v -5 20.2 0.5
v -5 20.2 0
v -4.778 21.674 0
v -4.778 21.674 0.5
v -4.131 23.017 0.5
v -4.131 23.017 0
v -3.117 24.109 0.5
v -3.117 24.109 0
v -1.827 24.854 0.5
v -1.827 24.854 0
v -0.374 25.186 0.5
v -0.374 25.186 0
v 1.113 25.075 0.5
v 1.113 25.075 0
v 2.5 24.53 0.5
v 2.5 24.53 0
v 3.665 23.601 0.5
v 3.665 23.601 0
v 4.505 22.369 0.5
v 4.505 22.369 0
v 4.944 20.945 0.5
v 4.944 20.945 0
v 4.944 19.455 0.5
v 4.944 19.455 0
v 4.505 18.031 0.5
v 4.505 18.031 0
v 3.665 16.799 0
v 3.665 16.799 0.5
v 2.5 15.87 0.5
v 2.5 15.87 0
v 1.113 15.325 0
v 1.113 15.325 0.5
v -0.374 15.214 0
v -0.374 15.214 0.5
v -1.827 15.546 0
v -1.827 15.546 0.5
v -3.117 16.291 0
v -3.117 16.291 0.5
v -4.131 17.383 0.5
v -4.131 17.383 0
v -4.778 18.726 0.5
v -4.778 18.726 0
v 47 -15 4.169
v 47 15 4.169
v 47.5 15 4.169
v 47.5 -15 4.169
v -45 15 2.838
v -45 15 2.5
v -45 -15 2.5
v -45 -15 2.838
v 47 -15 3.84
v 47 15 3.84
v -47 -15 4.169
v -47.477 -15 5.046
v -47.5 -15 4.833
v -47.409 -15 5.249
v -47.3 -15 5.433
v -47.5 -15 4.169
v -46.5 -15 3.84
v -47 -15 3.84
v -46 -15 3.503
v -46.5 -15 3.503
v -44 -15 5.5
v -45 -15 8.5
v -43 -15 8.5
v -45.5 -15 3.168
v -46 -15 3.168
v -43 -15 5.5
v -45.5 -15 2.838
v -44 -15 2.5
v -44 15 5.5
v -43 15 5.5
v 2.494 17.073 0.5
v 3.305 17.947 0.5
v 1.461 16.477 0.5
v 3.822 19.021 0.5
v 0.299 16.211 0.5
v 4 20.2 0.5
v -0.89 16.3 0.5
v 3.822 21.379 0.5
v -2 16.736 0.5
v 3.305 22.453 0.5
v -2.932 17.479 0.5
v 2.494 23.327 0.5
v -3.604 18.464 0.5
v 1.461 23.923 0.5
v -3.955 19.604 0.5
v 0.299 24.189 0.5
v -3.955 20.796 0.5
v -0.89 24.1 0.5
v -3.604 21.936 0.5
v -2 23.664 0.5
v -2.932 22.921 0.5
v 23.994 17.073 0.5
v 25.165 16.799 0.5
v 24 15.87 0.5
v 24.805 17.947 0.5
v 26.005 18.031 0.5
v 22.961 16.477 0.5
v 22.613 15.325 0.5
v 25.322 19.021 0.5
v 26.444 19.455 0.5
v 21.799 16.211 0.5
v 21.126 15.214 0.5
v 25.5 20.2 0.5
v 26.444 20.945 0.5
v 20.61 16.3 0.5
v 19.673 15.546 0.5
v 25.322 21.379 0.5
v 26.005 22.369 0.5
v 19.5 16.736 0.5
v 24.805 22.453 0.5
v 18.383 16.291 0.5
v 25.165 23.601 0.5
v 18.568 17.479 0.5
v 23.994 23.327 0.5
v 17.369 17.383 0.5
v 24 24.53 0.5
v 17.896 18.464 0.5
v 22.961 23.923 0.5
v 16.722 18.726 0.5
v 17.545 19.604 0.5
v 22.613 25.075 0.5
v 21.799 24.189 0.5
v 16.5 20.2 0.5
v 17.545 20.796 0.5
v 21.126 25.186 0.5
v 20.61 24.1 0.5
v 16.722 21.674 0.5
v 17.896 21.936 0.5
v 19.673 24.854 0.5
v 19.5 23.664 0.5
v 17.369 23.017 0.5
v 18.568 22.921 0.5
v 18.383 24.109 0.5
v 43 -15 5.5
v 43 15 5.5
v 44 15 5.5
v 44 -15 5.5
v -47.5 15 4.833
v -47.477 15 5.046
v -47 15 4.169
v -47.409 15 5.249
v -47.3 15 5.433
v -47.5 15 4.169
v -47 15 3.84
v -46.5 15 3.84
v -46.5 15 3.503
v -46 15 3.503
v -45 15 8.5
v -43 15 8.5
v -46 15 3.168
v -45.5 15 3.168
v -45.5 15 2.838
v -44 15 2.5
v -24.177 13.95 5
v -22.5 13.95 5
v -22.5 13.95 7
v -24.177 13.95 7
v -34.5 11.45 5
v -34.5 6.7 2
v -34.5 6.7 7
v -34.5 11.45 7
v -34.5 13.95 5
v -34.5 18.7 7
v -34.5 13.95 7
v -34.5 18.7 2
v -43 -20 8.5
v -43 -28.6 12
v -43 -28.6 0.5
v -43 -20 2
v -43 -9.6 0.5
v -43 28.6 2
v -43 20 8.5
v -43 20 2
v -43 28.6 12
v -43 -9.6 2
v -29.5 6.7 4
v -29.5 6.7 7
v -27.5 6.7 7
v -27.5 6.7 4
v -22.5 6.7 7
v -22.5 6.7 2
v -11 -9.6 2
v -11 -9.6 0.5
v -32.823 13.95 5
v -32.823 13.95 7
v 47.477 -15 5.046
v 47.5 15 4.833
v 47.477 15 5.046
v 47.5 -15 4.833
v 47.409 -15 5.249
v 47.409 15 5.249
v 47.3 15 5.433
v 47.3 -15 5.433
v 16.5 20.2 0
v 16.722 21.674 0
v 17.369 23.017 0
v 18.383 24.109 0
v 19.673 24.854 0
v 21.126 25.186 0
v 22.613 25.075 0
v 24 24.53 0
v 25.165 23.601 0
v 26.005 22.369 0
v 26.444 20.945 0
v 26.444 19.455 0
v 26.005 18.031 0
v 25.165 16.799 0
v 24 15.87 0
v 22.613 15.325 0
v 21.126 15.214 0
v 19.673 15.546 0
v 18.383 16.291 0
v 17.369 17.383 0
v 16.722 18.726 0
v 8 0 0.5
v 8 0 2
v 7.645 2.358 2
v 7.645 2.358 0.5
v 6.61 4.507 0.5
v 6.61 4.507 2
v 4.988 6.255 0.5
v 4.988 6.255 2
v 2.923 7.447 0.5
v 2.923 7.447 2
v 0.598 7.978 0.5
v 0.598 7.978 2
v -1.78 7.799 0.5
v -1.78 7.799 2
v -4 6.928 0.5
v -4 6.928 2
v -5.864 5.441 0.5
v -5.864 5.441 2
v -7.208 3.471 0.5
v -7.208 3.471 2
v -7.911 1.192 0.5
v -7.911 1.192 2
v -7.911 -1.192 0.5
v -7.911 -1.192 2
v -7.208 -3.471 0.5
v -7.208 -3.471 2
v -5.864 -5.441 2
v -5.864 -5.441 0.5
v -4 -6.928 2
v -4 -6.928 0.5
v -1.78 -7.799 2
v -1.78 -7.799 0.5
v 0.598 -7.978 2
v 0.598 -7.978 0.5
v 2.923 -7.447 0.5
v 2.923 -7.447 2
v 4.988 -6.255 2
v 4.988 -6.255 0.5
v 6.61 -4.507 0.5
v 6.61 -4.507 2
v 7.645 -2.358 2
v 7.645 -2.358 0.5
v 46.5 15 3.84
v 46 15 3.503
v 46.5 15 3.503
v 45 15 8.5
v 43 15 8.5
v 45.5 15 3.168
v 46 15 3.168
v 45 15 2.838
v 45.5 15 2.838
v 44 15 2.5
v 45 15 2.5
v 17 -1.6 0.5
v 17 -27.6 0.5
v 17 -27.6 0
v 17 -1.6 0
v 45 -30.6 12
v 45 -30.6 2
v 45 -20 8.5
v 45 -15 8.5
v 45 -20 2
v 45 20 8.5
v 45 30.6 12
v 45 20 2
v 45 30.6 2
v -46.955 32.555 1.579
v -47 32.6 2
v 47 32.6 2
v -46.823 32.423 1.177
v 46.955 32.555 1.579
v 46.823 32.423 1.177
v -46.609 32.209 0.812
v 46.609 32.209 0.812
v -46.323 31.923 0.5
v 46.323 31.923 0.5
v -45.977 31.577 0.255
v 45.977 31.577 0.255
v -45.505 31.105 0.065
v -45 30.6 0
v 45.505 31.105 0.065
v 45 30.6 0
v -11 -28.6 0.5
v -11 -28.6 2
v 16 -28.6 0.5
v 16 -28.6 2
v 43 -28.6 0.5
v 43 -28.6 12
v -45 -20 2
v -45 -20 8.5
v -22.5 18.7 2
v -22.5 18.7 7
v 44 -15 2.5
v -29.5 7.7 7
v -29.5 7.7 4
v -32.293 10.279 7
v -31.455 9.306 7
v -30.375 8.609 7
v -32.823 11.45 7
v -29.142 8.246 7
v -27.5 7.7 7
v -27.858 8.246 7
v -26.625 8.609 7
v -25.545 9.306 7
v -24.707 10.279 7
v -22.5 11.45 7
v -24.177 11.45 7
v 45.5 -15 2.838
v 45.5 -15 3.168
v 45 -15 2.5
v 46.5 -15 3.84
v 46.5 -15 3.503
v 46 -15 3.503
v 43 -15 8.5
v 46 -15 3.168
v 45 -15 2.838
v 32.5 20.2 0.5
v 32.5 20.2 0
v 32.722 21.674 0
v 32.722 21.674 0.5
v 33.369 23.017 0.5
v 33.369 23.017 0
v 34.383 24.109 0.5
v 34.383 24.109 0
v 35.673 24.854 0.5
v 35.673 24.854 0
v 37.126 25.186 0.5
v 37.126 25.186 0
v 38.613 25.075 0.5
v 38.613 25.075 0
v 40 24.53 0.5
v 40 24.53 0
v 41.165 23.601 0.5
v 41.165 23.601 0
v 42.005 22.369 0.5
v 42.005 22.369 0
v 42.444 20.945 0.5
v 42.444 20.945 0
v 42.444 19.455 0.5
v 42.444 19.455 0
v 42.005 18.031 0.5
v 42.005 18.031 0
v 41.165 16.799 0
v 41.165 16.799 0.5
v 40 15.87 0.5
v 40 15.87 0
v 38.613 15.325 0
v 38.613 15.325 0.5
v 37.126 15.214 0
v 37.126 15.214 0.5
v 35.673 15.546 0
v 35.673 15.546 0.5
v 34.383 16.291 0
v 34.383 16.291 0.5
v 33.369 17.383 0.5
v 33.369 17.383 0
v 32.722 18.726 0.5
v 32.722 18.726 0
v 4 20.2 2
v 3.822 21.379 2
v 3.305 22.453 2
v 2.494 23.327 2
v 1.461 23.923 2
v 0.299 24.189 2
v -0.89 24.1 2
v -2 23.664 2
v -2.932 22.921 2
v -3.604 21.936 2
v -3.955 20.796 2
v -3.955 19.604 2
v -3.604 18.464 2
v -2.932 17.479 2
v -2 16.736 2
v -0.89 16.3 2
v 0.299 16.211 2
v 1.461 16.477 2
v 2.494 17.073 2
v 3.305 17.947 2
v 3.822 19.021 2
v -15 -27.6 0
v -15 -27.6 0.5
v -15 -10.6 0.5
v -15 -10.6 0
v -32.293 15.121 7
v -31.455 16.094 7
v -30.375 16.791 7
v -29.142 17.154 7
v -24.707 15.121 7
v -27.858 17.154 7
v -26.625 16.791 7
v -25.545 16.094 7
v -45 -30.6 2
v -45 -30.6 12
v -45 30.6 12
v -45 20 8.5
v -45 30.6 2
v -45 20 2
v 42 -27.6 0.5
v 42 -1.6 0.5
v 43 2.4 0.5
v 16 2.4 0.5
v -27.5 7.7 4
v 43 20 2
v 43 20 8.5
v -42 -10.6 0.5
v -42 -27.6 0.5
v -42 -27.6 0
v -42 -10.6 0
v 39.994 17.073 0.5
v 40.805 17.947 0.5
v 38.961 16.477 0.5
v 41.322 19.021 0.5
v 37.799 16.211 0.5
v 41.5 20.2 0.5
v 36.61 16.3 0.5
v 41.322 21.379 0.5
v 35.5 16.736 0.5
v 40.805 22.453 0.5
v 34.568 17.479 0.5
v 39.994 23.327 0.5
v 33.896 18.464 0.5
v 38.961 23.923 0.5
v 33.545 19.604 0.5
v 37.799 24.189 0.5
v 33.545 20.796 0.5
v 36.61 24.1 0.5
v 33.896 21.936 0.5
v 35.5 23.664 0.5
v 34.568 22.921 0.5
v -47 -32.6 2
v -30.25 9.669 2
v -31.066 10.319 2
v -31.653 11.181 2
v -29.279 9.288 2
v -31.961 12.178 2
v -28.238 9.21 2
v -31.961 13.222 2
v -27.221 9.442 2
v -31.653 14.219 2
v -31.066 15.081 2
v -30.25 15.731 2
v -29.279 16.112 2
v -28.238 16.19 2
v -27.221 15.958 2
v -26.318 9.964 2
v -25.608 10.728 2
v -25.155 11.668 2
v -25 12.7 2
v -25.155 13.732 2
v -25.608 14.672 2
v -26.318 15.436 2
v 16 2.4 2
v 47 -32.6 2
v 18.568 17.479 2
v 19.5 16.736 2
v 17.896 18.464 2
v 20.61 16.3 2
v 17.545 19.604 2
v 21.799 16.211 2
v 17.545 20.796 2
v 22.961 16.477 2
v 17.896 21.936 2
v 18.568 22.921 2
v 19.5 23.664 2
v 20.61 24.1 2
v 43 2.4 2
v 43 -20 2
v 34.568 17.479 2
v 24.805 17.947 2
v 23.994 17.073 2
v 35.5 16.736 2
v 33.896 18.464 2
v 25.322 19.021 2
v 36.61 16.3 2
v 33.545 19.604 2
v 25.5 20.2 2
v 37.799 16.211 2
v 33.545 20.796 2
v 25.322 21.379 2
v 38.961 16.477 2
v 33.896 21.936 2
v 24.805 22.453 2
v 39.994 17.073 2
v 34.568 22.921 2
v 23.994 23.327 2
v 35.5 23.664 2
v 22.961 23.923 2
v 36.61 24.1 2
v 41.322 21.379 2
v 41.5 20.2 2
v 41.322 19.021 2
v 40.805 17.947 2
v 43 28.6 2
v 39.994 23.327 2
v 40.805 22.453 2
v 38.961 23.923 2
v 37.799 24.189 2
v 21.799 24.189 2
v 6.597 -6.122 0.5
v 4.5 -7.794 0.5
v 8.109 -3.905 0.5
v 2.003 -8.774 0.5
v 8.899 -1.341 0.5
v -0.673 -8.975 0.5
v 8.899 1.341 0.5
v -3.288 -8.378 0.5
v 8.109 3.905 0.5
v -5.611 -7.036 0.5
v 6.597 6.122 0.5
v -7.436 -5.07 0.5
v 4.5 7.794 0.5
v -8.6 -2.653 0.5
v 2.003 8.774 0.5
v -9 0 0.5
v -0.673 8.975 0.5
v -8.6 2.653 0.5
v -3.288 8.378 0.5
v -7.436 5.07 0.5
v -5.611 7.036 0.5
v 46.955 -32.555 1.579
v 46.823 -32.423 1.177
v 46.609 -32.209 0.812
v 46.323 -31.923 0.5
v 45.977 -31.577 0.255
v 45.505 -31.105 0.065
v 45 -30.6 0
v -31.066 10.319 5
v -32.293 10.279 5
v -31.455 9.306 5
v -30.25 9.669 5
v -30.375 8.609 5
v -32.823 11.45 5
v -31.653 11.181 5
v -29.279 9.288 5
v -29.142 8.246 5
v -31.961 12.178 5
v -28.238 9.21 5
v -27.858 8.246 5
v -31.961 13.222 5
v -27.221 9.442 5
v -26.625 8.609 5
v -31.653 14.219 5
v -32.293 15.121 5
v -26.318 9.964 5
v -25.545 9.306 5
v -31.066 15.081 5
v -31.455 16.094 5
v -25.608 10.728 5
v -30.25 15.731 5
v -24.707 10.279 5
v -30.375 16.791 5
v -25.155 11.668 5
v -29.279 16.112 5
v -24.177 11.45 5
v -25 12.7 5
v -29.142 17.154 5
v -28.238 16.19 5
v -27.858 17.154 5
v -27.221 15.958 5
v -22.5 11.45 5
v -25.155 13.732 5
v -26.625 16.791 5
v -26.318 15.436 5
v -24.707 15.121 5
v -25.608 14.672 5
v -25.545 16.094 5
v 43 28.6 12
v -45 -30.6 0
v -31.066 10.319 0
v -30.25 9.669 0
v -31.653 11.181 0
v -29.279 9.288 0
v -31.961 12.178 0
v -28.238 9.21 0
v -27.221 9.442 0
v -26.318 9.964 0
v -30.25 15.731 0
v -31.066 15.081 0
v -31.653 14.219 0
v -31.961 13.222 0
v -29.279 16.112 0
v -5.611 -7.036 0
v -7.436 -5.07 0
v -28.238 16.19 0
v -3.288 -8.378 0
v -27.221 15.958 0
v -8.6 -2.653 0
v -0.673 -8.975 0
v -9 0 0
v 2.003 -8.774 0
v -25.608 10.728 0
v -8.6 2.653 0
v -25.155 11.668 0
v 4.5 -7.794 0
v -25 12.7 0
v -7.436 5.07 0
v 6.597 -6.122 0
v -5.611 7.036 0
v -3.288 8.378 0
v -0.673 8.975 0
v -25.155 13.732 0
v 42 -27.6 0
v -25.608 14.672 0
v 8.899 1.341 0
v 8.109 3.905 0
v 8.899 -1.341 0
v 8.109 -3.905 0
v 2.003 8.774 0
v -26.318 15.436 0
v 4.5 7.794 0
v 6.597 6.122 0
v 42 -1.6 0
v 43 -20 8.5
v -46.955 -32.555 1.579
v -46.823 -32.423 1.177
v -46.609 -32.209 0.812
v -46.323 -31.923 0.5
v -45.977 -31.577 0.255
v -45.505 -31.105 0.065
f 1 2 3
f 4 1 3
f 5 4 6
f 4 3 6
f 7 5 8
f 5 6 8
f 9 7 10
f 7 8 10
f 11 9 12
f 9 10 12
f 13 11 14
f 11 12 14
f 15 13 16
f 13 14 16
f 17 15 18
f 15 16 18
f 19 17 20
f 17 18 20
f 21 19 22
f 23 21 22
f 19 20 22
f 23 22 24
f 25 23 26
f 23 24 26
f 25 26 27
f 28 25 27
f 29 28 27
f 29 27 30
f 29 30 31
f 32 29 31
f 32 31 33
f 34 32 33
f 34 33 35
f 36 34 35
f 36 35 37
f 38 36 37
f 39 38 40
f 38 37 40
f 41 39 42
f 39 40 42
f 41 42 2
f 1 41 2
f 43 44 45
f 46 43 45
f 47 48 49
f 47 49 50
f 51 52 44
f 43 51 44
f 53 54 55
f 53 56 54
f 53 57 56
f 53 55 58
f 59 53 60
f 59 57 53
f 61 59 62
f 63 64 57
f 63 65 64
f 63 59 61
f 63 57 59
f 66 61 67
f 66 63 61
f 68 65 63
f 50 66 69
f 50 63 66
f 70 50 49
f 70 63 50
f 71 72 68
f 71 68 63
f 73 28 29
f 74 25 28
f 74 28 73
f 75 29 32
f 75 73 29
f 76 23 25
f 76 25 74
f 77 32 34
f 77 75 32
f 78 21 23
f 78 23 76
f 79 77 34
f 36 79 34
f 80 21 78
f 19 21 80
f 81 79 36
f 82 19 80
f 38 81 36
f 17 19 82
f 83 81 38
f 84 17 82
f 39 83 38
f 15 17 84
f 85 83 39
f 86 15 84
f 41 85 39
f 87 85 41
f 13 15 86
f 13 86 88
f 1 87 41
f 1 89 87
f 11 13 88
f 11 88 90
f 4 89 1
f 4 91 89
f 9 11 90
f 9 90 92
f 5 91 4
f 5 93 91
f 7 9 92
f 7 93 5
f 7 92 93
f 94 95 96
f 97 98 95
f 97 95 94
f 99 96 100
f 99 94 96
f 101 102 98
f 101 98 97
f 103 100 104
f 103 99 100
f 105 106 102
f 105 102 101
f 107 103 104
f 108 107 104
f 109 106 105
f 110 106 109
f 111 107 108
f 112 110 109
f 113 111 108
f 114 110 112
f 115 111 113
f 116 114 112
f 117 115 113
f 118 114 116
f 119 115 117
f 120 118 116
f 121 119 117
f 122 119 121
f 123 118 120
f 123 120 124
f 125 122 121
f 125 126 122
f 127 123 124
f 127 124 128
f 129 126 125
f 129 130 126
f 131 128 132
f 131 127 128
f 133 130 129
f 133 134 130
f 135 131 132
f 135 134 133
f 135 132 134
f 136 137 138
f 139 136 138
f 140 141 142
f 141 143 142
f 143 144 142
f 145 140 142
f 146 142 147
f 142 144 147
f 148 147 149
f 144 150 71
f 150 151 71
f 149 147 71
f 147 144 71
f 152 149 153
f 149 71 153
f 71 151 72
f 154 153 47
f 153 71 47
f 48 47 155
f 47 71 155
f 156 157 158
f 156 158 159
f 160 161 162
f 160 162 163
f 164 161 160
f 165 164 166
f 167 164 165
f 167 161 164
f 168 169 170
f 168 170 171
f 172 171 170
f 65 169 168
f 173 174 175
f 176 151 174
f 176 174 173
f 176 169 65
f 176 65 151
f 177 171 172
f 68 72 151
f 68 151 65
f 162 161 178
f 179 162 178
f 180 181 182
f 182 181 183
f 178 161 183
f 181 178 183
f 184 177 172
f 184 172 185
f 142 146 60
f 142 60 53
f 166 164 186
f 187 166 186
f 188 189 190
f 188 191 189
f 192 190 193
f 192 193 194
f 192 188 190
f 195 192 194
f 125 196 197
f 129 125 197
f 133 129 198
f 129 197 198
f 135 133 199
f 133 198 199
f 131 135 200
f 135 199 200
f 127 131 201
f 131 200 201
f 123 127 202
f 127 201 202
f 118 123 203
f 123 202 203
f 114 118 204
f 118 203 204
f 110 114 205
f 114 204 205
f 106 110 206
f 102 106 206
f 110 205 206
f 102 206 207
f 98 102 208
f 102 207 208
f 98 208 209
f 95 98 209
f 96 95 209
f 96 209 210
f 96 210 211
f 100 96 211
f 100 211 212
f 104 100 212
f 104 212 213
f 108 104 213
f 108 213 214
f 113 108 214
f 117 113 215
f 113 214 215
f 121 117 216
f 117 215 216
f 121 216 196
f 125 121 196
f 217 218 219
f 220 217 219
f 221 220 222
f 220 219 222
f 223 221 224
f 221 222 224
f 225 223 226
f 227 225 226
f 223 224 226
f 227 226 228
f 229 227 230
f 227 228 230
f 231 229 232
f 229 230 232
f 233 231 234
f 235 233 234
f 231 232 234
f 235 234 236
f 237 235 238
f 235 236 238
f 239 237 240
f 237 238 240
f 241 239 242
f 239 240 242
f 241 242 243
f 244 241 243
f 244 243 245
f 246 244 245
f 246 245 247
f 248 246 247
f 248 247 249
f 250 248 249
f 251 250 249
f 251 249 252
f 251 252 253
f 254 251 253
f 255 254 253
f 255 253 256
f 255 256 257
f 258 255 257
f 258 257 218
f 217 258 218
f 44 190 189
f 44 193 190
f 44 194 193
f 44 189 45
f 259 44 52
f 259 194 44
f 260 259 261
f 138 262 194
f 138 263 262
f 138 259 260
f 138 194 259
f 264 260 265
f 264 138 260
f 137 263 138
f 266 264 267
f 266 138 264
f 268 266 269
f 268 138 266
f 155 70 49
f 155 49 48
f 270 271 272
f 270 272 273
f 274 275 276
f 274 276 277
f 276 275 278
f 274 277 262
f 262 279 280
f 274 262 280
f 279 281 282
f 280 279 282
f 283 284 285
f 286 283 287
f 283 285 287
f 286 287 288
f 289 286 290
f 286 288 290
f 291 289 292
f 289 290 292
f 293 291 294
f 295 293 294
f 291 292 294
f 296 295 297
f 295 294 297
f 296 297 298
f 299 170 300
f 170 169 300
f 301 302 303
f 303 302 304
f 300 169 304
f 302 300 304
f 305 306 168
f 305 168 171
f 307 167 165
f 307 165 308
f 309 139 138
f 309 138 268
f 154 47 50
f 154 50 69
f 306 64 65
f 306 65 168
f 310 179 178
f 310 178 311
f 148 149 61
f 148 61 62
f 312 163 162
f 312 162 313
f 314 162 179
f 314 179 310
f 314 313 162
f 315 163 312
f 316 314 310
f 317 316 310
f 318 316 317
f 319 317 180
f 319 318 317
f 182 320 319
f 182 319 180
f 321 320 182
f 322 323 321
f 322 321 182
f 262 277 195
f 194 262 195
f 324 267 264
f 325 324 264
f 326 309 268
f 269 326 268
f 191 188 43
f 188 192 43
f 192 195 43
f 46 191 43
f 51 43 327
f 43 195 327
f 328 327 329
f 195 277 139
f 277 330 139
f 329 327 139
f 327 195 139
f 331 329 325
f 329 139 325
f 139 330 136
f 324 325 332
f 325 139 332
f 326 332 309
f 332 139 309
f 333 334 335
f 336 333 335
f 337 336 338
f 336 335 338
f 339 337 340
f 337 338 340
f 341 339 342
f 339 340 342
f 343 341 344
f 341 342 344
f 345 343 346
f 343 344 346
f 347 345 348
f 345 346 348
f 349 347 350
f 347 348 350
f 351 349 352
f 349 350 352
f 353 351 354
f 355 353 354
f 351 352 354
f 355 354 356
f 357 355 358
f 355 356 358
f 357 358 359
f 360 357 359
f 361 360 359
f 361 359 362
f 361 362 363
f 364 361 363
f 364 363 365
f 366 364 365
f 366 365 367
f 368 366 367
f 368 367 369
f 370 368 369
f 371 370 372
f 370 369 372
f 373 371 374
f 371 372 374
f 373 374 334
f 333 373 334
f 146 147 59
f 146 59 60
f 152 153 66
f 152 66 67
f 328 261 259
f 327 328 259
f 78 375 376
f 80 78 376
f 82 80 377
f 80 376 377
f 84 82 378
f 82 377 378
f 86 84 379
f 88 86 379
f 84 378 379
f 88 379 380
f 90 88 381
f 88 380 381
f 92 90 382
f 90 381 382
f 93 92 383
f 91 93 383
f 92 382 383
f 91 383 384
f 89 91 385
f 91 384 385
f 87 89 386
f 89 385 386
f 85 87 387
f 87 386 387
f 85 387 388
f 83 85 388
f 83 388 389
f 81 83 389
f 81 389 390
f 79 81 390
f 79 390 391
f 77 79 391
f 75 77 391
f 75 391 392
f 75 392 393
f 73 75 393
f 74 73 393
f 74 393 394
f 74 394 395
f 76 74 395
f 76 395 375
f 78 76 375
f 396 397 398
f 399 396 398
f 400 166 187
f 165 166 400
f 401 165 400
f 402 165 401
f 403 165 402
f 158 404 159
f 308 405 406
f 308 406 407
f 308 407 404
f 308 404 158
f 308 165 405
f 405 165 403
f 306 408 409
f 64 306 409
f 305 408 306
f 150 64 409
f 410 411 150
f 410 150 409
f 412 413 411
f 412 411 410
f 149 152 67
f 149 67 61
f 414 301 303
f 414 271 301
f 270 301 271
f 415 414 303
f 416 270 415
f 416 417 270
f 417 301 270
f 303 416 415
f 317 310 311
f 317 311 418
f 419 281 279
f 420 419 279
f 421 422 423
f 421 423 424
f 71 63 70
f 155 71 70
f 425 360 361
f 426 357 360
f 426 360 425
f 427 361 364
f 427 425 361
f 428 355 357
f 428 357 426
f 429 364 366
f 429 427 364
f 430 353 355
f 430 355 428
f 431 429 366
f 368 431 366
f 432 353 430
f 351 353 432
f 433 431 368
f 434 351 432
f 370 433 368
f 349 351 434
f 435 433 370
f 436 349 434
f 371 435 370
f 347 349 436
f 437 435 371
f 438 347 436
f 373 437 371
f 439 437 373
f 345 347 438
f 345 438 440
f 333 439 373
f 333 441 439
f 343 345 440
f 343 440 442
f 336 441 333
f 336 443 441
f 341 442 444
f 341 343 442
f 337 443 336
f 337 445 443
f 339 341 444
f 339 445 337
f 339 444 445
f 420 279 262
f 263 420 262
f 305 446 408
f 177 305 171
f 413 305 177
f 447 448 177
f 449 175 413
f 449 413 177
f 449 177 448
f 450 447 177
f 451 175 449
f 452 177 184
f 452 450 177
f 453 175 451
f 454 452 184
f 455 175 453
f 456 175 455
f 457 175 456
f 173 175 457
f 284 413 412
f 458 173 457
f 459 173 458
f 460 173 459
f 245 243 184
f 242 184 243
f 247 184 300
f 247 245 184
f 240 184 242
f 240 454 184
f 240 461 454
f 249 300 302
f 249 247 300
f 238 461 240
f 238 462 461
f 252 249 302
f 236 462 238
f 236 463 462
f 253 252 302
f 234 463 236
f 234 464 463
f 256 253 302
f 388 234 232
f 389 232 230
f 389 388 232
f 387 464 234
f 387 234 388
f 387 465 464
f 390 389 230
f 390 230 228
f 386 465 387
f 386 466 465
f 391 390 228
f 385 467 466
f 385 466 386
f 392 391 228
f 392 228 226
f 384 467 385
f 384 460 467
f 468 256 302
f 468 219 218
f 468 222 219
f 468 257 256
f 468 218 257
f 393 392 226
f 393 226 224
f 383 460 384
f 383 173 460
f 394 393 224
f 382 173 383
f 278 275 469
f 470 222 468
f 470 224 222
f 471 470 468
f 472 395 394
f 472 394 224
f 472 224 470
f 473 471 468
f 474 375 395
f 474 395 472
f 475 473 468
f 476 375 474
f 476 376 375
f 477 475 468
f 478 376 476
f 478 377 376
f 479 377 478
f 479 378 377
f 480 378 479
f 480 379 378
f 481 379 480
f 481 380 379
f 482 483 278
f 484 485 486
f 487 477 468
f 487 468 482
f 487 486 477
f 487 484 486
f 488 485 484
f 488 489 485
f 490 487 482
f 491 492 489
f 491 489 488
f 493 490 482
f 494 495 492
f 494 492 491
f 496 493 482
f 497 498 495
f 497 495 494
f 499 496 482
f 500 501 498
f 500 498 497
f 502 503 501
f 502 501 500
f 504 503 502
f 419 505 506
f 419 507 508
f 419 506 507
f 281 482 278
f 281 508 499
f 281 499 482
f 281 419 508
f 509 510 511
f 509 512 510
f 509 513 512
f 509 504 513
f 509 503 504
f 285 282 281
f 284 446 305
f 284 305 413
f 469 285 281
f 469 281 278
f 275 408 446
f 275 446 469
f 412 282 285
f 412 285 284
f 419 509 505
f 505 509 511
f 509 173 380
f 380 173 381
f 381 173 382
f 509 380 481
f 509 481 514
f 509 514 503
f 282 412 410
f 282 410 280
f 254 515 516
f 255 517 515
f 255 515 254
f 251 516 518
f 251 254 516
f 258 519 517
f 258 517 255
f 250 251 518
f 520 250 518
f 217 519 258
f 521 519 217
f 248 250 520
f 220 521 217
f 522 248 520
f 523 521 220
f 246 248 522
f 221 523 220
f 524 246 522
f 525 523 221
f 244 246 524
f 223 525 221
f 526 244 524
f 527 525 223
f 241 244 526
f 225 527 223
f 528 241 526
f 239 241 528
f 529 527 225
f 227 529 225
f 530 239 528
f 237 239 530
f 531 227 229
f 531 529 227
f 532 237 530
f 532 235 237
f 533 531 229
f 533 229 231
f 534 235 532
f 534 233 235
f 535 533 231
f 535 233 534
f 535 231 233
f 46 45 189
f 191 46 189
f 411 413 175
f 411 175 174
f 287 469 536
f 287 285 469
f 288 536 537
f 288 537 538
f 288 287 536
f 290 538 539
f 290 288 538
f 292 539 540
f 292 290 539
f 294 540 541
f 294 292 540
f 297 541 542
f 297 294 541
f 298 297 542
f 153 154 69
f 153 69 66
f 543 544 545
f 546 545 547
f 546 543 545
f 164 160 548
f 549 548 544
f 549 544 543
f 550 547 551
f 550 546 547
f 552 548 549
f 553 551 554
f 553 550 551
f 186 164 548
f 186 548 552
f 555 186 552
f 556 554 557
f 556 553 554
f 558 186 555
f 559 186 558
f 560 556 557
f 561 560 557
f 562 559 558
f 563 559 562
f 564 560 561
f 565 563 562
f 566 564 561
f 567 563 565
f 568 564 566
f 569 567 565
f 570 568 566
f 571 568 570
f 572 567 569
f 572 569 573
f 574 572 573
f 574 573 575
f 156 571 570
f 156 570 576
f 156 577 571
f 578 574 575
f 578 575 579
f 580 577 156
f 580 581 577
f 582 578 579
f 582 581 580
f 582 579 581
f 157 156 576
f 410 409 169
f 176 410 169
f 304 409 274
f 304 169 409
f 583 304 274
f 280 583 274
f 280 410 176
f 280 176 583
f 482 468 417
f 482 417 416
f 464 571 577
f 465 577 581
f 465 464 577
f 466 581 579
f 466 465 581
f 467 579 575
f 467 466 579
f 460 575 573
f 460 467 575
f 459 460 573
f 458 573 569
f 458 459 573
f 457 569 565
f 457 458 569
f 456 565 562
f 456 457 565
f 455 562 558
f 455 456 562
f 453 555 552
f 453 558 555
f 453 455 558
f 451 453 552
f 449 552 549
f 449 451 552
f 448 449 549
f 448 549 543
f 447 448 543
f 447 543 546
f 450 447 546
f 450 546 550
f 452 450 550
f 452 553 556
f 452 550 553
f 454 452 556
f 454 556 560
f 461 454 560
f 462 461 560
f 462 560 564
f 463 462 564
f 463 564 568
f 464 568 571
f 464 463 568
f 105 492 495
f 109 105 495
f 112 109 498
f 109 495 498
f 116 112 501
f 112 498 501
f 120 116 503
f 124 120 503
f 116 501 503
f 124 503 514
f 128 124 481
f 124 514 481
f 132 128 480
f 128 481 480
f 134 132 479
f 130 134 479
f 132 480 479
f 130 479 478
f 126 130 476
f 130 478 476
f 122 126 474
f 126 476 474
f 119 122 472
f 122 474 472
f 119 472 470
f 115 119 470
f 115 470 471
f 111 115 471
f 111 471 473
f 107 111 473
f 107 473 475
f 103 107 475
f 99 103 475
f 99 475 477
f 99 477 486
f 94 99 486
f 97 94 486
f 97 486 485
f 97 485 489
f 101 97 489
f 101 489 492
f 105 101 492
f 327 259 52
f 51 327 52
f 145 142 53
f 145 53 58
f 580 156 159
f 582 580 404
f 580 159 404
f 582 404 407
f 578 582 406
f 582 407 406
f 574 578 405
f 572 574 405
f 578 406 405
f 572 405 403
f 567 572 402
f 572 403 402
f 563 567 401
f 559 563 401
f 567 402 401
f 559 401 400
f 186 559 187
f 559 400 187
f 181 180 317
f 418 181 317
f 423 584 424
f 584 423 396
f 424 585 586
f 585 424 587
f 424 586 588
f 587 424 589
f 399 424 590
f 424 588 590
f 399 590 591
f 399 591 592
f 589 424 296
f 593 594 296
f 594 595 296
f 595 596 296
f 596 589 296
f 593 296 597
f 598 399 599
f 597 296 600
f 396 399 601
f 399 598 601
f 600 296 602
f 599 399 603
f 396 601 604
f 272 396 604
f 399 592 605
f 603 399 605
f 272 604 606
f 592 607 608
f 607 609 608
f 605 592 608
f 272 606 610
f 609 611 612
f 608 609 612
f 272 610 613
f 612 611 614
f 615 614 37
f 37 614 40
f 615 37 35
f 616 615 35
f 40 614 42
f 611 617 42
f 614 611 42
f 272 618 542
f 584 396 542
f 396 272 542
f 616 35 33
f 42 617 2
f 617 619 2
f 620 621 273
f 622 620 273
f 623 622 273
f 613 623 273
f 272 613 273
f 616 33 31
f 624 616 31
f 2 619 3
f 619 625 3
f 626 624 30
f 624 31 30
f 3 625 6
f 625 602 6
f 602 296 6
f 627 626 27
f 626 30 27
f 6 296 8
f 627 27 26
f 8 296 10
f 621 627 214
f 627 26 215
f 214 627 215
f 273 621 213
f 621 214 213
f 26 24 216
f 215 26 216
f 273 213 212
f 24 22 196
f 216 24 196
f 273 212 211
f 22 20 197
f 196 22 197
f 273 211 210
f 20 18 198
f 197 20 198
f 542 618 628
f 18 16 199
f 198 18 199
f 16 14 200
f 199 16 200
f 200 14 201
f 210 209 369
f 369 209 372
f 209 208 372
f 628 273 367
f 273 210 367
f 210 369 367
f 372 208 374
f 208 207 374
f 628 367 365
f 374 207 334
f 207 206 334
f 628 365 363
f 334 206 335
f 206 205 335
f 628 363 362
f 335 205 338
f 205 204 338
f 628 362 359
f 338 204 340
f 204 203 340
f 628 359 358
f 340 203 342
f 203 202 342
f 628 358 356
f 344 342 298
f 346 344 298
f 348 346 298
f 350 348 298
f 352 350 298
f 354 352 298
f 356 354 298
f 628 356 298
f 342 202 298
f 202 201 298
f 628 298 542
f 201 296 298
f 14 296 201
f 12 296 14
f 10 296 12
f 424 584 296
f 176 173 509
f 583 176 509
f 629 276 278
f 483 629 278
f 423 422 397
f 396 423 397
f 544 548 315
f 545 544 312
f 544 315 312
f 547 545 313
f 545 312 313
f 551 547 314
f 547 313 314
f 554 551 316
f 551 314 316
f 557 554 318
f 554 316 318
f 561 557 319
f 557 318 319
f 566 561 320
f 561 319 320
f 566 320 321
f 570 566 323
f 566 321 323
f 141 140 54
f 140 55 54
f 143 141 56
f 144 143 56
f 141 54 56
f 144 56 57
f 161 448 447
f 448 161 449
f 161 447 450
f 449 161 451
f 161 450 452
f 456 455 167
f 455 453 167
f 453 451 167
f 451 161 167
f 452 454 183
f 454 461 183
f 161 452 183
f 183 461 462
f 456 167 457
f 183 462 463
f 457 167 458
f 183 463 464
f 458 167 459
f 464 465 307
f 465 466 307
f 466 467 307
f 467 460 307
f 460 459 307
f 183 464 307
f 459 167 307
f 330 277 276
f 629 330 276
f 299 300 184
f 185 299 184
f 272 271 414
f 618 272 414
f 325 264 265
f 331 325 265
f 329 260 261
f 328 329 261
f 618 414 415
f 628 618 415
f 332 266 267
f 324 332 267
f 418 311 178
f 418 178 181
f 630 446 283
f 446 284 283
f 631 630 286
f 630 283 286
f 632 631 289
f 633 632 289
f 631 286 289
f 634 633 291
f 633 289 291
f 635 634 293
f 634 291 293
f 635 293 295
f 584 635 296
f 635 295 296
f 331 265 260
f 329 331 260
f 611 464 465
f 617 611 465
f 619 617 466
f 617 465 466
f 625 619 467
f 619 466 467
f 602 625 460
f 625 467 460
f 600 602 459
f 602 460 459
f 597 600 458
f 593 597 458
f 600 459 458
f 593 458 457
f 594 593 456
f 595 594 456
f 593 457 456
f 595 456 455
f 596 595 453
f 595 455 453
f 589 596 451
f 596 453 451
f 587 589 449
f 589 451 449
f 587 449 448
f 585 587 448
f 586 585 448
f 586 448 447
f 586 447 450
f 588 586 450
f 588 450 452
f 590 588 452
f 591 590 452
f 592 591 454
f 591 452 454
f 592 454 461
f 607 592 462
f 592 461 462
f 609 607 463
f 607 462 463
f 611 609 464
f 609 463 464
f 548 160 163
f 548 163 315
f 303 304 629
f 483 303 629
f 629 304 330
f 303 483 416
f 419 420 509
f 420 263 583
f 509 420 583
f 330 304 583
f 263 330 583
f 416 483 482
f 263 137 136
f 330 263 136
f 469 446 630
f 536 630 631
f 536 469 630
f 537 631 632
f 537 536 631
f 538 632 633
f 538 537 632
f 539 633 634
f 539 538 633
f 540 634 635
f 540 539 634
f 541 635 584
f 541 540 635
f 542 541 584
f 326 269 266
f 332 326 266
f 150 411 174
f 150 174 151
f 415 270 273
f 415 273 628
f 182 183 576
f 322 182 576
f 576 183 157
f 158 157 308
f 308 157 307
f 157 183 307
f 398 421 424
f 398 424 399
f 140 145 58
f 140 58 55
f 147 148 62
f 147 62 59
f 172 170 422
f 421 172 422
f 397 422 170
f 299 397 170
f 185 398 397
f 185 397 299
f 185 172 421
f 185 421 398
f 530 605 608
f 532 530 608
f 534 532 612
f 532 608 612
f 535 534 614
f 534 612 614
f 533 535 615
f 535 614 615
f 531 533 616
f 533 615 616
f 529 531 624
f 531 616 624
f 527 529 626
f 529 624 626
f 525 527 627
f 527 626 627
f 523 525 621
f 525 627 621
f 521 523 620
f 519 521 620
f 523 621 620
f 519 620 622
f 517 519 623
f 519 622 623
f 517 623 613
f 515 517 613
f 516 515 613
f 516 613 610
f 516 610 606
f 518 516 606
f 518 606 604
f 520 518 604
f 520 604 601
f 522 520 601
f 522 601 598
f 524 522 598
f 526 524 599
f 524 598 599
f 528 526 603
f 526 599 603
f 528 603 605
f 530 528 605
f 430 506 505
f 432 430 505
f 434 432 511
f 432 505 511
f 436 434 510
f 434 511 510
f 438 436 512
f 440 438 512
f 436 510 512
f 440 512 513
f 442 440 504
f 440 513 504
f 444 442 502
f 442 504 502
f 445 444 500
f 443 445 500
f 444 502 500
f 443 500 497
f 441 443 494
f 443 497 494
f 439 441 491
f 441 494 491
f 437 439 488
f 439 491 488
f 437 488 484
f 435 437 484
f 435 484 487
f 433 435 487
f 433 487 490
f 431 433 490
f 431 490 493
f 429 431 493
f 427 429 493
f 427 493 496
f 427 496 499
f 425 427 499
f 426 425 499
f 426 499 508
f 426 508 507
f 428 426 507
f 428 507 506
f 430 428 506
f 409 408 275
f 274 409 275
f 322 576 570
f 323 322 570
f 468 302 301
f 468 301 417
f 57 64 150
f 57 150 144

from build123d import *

# Parameters (mm, degrees)
SKETCH_1_W             = 94
SKETCH_1_H             = 65.2
EXTRUDE_1_DEPTH        = 2
SKETCH_2_R             = 8
SKETCH_2_R_2           = 3.5
SKETCH_2_R_3           = 4
SKETCH_2_W             = 27
SKETCH_2_H             = 17
SKETCH_2_W_2           = 25
SKETCH_2_H_2           = 26
CUT_EXTRUDE_1_DEPTH    = 2
SKETCH_3_W             = 90
SKETCH_3_H             = 61.2
SKETCH_3_W_2           = 86
SKETCH_3_H_2           = 57.2
EXTRUDE_2_DEPTH        = 10
SKETCH_4_R             = 9
SKETCH_4_R_2           = 5
CUT_EXTRUDE_4_DEPTH    = 0.5
SKETCH_5_W             = 27
SKETCH_5_H             = 31
SKETCH_5_W_2           = 32
SKETCH_5_H_2           = 19
CUT_EXTRUDE_5_DEPTH    = 1.5
SKETCH_6_W             = 12
SKETCH_6_H             = 12
SKETCH_6_R             = 3.5
EXTRUDE_4_DEPTH        = 5
SKETCH_7_W             = 2
SKETCH_7_H             = 1
CUT_EXTRUDE_6_DEPTH    = 3
CUT_EXTRUDE_7_DEPTH    = 2
SKETCH_10_W            = 6
SKETCH_10_H            = 30
EXTRUDE_5_DEPTH        = 3
CUT_EXTRUDE_9_DEPTH    = 30
CUT_EXTRUDE_10_DEPTH   = 30
CUT_EXTRUDE_11_DEPTH   = 30
FILLET_1_R             = 1
FILLET_2_R             = 2
FILLET_1_OF_MIRROR_9_R = 1
SKETCH_17_R            = 4.5
CUT_EXTRUDE_13_DEPTH   = 2
SKETCH_18_W            = 1.677095884
SKETCH_18_H            = 2.5
CUT_EXTRUDE_14_DEPTH   = 2
SKETCH_19_W            = 1
SKETCH_19_H            = 3
CUT_EXTRUDE_15_DEPTH   = 30


with BuildPart() as part:
    # 草图1 → 凸台-拉伸1 (new body)
    with BuildSketch(Plane.XY):
        Rectangle(SKETCH_1_W, SKETCH_1_H)
    extrude(amount=EXTRUDE_1_DEPTH)

    # 草图2 → 切除-拉伸1 (cut)
    with BuildSketch(Plane.XY.offset(2)):
        Circle(SKETCH_2_R)
        with Locations((-28.5, 12.7)):
            Circle(SKETCH_2_R_2)
        with Locations((37.5, 20.2)):
            Circle(SKETCH_2_R_3)
        with Locations((21.5, 20.2)):
            Circle(SKETCH_2_R_3)
        with Locations((0, 20.2)):
            Circle(SKETCH_2_R_3)
        with Locations((-28.5, -19.1)):
            Rectangle(SKETCH_2_W, SKETCH_2_H)
        with Locations((29.5, -14.6)):
            Rectangle(SKETCH_2_W_2, SKETCH_2_H_2)
    extrude(amount=-CUT_EXTRUDE_1_DEPTH, mode=Mode.SUBTRACT)

    # 草图3 → 凸台-拉伸2 (add)
    with BuildSketch(Plane.XY.offset(2)):
        Rectangle(SKETCH_3_W, SKETCH_3_H)
        Rectangle(SKETCH_3_W_2, SKETCH_3_H_2, mode=Mode.SUBTRACT)
    extrude(amount=EXTRUDE_2_DEPTH)

    # 草图4 → 切除-拉伸4 (cut)
    with BuildSketch(Plane(origin=(0, 0, 0), x_dir=(-1, 0, 0), z_dir=(0, 0, -1))):
        Circle(SKETCH_4_R)
        with Locations((0, 20.2)):
            Circle(SKETCH_4_R_2)
        with Locations((-21.5, 20.2)):
            Circle(SKETCH_4_R_2)
        with Locations((-37.5, 20.2)):
            Circle(SKETCH_4_R_2)
    extrude(amount=-CUT_EXTRUDE_4_DEPTH, mode=Mode.SUBTRACT)

    # 草图5 → 切除-拉伸5 (cut)
    with BuildSketch(Plane.XY.offset(2)):
        with Locations((29.5, -13.1)):
            Rectangle(SKETCH_5_W, SKETCH_5_H)
        with Locations((-27, -19.1)):
            Rectangle(SKETCH_5_W_2, SKETCH_5_H_2)
    extrude(amount=-CUT_EXTRUDE_5_DEPTH, mode=Mode.SUBTRACT)

    # 草图9 → 切除-拉伸7 (cut)
    with BuildSketch(Plane(origin=(45, 0, 0), x_dir=(0, 0, -1), z_dir=(1, 0, 0))):
        Polygon((-8.5, 20), (-8.5, 15), (-2.5, 15), (-2.5, -15), (-8.5, -15), (-8.5, -20), (-4.518745162, -20), (-2, -20), (-2, 20), align=None)
    cut_extrude_7 = extrude(amount=-CUT_EXTRUDE_7_DEPTH, mode=Mode.SUBTRACT)

    # 草图10 → 凸台-拉伸5 (add)
    with BuildSketch(Plane(origin=(45, 0, 0), x_dir=(0, 0, -1), z_dir=(1, 0, 0))):
        with Locations((-5.5, 0)):
            Rectangle(SKETCH_10_W, SKETCH_10_H)
    extrude_5 = extrude(amount=EXTRUDE_5_DEPTH)

    # 草图13 → 切除-拉伸9 (cut)
    with BuildSketch(Plane(origin=(0, 15, 0), x_dir=(1, 0, 0), z_dir=(0, 1, 0))):
        Polygon((48, -4.5), (48, -2.5), (45, -2.5), (45, -2.837675063), (45.5, -2.837675063), (45.5, -3.168378765), (46, -3.168378765), (46, -3.502957406), (46.5, -3.502957406), (46.5, -3.840024676), (47, -3.840024676), (47, -4.169256843), (47.5, -4.169256843), (47.5, -4.5), align=None)
    cut_extrude_9 = extrude(amount=-CUT_EXTRUDE_9_DEPTH, mode=Mode.SUBTRACT)

    # 草图14 → 切除-拉伸10 (cut)
    with BuildSketch(Plane(origin=(0, 15, 0), x_dir=(1, 0, 0), z_dir=(0, 1, 0))):
        Polygon((45, -8.5), (48, -4.5), (48, -8.5), align=None)
    cut_extrude_10 = extrude(amount=-CUT_EXTRUDE_10_DEPTH, mode=Mode.SUBTRACT)

    # 草图15 → 切除-拉伸11 (cut)
    with BuildSketch(Plane(origin=(0, 15, 0), x_dir=(1, 0, 0), z_dir=(0, 1, 0))):
        Polygon((47.5, -4.5), (47.5, -5.166666667), (48, -4.5), align=None)
    cut_extrude_11 = extrude(amount=-CUT_EXTRUDE_11_DEPTH, mode=Mode.SUBTRACT)

    # 圆角1
    fillet_1_edges = [part.edges().sort_by_distance(p)[0] for p in [
        (47.5, 0, 5.166666667),
    ]]
    fillet(fillet_1_edges, radius=FILLET_1_R)

    # 圆角2
    fillet_2_edges = [part.edges().sort_by_distance(p)[0] for p in [
        (47, 0, 0),
        (0, -32.6, 0),
        (-47, 0, 0),
        (0, 32.6, 0),
    ]]
    fillet(fillet_2_edges, radius=FILLET_2_R - 0.0001)  # a hair under: the kernel refuses the full size

    # 镜向9: 切除-拉伸7, 凸台-拉伸5, 切除-拉伸9, 切除-拉伸10, 切除-拉伸11 across plane
    add(cut_extrude_7.mirror(Plane(origin=(0, 0, 0), x_dir=(0, 0, 1), z_dir=(1, 0, 0))), mode=Mode.SUBTRACT)
    add(extrude_5.mirror(Plane(origin=(0, 0, 0), x_dir=(0, 0, 1), z_dir=(1, 0, 0))))
    add(cut_extrude_9.mirror(Plane(origin=(0, 0, 0), x_dir=(0, 0, 1), z_dir=(1, 0, 0))), mode=Mode.SUBTRACT)
    add(cut_extrude_10.mirror(Plane(origin=(0, 0, 0), x_dir=(0, 0, 1), z_dir=(1, 0, 0))), mode=Mode.SUBTRACT)
    add(cut_extrude_11.mirror(Plane(origin=(0, 0, 0), x_dir=(0, 0, 1), z_dir=(1, 0, 0))), mode=Mode.SUBTRACT)

    # 圆角1 of 镜向9
    fillet_1_of_mirror_9_edges = [part.edges().sort_by_distance(p)[0] for p in [
        (-47.5, 0, 5.166666667),
    ]]
    fillet(fillet_1_of_mirror_9_edges, radius=FILLET_1_OF_MIRROR_9_R)

    # 草图19 → 切除-拉伸15 (cut)
    with BuildSketch(Plane(origin=(0, 15, 0), x_dir=(1, 0, 0), z_dir=(0, 1, 0))):
        with Locations((43.5, -4)):
            Rectangle(SKETCH_19_W, SKETCH_19_H)
    cut_extrude_15 = extrude(amount=-CUT_EXTRUDE_15_DEPTH, mode=Mode.SUBTRACT)

    # 镜向11: 切除-拉伸15 across plane
    add(cut_extrude_15.mirror(Plane(origin=(0, 0, 0), x_dir=(0, 0, 1), z_dir=(1, 0, 0))), mode=Mode.SUBTRACT)


with BuildPart() as body_2:
    # 草图6 → 凸台-拉伸4 (new body)
    with BuildSketch(Plane.XY.offset(2)):
        with Locations((-28.5, 12.7)):
            Rectangle(SKETCH_6_W, SKETCH_6_H)
        with Locations((-28.5, 12.7)):
            Circle(SKETCH_6_R, mode=Mode.SUBTRACT)
    extrude(amount=EXTRUDE_4_DEPTH)

    # 草图7 → 切除-拉伸6 (cut)
    with BuildSketch(Plane.XY.offset(7)):
        with Locations((-28.5, 7.2)):
            Rectangle(SKETCH_7_W, SKETCH_7_H)
    extrude(amount=-CUT_EXTRUDE_6_DEPTH, mode=Mode.SUBTRACT)

    # 草图17 → 切除-拉伸13 (cut)
    with BuildSketch(Plane.XY.offset(7)):
        with Locations((-28.5, 12.7)):
            Circle(SKETCH_17_R)
    extrude(amount=-CUT_EXTRUDE_13_DEPTH, mode=Mode.SUBTRACT)

    # 草图18 → 切除-拉伸14 (cut)
    with BuildSketch(Plane.XY.offset(7)):
        with Locations((-33.661452058, 12.7)):
            Rectangle(SKETCH_18_W, SKETCH_18_H)
    cut_extrude_14 = extrude(amount=-CUT_EXTRUDE_14_DEPTH, mode=Mode.SUBTRACT)

    # 镜向10: 切除-拉伸14 across plane
    add(cut_extrude_14.mirror(Plane(origin=(-28.5, 0, 0), x_dir=(0, 0, 1), z_dir=(1, 0, 0))), mode=Mode.SUBTRACT)


solid = Compound([part.part, body_2.part])
